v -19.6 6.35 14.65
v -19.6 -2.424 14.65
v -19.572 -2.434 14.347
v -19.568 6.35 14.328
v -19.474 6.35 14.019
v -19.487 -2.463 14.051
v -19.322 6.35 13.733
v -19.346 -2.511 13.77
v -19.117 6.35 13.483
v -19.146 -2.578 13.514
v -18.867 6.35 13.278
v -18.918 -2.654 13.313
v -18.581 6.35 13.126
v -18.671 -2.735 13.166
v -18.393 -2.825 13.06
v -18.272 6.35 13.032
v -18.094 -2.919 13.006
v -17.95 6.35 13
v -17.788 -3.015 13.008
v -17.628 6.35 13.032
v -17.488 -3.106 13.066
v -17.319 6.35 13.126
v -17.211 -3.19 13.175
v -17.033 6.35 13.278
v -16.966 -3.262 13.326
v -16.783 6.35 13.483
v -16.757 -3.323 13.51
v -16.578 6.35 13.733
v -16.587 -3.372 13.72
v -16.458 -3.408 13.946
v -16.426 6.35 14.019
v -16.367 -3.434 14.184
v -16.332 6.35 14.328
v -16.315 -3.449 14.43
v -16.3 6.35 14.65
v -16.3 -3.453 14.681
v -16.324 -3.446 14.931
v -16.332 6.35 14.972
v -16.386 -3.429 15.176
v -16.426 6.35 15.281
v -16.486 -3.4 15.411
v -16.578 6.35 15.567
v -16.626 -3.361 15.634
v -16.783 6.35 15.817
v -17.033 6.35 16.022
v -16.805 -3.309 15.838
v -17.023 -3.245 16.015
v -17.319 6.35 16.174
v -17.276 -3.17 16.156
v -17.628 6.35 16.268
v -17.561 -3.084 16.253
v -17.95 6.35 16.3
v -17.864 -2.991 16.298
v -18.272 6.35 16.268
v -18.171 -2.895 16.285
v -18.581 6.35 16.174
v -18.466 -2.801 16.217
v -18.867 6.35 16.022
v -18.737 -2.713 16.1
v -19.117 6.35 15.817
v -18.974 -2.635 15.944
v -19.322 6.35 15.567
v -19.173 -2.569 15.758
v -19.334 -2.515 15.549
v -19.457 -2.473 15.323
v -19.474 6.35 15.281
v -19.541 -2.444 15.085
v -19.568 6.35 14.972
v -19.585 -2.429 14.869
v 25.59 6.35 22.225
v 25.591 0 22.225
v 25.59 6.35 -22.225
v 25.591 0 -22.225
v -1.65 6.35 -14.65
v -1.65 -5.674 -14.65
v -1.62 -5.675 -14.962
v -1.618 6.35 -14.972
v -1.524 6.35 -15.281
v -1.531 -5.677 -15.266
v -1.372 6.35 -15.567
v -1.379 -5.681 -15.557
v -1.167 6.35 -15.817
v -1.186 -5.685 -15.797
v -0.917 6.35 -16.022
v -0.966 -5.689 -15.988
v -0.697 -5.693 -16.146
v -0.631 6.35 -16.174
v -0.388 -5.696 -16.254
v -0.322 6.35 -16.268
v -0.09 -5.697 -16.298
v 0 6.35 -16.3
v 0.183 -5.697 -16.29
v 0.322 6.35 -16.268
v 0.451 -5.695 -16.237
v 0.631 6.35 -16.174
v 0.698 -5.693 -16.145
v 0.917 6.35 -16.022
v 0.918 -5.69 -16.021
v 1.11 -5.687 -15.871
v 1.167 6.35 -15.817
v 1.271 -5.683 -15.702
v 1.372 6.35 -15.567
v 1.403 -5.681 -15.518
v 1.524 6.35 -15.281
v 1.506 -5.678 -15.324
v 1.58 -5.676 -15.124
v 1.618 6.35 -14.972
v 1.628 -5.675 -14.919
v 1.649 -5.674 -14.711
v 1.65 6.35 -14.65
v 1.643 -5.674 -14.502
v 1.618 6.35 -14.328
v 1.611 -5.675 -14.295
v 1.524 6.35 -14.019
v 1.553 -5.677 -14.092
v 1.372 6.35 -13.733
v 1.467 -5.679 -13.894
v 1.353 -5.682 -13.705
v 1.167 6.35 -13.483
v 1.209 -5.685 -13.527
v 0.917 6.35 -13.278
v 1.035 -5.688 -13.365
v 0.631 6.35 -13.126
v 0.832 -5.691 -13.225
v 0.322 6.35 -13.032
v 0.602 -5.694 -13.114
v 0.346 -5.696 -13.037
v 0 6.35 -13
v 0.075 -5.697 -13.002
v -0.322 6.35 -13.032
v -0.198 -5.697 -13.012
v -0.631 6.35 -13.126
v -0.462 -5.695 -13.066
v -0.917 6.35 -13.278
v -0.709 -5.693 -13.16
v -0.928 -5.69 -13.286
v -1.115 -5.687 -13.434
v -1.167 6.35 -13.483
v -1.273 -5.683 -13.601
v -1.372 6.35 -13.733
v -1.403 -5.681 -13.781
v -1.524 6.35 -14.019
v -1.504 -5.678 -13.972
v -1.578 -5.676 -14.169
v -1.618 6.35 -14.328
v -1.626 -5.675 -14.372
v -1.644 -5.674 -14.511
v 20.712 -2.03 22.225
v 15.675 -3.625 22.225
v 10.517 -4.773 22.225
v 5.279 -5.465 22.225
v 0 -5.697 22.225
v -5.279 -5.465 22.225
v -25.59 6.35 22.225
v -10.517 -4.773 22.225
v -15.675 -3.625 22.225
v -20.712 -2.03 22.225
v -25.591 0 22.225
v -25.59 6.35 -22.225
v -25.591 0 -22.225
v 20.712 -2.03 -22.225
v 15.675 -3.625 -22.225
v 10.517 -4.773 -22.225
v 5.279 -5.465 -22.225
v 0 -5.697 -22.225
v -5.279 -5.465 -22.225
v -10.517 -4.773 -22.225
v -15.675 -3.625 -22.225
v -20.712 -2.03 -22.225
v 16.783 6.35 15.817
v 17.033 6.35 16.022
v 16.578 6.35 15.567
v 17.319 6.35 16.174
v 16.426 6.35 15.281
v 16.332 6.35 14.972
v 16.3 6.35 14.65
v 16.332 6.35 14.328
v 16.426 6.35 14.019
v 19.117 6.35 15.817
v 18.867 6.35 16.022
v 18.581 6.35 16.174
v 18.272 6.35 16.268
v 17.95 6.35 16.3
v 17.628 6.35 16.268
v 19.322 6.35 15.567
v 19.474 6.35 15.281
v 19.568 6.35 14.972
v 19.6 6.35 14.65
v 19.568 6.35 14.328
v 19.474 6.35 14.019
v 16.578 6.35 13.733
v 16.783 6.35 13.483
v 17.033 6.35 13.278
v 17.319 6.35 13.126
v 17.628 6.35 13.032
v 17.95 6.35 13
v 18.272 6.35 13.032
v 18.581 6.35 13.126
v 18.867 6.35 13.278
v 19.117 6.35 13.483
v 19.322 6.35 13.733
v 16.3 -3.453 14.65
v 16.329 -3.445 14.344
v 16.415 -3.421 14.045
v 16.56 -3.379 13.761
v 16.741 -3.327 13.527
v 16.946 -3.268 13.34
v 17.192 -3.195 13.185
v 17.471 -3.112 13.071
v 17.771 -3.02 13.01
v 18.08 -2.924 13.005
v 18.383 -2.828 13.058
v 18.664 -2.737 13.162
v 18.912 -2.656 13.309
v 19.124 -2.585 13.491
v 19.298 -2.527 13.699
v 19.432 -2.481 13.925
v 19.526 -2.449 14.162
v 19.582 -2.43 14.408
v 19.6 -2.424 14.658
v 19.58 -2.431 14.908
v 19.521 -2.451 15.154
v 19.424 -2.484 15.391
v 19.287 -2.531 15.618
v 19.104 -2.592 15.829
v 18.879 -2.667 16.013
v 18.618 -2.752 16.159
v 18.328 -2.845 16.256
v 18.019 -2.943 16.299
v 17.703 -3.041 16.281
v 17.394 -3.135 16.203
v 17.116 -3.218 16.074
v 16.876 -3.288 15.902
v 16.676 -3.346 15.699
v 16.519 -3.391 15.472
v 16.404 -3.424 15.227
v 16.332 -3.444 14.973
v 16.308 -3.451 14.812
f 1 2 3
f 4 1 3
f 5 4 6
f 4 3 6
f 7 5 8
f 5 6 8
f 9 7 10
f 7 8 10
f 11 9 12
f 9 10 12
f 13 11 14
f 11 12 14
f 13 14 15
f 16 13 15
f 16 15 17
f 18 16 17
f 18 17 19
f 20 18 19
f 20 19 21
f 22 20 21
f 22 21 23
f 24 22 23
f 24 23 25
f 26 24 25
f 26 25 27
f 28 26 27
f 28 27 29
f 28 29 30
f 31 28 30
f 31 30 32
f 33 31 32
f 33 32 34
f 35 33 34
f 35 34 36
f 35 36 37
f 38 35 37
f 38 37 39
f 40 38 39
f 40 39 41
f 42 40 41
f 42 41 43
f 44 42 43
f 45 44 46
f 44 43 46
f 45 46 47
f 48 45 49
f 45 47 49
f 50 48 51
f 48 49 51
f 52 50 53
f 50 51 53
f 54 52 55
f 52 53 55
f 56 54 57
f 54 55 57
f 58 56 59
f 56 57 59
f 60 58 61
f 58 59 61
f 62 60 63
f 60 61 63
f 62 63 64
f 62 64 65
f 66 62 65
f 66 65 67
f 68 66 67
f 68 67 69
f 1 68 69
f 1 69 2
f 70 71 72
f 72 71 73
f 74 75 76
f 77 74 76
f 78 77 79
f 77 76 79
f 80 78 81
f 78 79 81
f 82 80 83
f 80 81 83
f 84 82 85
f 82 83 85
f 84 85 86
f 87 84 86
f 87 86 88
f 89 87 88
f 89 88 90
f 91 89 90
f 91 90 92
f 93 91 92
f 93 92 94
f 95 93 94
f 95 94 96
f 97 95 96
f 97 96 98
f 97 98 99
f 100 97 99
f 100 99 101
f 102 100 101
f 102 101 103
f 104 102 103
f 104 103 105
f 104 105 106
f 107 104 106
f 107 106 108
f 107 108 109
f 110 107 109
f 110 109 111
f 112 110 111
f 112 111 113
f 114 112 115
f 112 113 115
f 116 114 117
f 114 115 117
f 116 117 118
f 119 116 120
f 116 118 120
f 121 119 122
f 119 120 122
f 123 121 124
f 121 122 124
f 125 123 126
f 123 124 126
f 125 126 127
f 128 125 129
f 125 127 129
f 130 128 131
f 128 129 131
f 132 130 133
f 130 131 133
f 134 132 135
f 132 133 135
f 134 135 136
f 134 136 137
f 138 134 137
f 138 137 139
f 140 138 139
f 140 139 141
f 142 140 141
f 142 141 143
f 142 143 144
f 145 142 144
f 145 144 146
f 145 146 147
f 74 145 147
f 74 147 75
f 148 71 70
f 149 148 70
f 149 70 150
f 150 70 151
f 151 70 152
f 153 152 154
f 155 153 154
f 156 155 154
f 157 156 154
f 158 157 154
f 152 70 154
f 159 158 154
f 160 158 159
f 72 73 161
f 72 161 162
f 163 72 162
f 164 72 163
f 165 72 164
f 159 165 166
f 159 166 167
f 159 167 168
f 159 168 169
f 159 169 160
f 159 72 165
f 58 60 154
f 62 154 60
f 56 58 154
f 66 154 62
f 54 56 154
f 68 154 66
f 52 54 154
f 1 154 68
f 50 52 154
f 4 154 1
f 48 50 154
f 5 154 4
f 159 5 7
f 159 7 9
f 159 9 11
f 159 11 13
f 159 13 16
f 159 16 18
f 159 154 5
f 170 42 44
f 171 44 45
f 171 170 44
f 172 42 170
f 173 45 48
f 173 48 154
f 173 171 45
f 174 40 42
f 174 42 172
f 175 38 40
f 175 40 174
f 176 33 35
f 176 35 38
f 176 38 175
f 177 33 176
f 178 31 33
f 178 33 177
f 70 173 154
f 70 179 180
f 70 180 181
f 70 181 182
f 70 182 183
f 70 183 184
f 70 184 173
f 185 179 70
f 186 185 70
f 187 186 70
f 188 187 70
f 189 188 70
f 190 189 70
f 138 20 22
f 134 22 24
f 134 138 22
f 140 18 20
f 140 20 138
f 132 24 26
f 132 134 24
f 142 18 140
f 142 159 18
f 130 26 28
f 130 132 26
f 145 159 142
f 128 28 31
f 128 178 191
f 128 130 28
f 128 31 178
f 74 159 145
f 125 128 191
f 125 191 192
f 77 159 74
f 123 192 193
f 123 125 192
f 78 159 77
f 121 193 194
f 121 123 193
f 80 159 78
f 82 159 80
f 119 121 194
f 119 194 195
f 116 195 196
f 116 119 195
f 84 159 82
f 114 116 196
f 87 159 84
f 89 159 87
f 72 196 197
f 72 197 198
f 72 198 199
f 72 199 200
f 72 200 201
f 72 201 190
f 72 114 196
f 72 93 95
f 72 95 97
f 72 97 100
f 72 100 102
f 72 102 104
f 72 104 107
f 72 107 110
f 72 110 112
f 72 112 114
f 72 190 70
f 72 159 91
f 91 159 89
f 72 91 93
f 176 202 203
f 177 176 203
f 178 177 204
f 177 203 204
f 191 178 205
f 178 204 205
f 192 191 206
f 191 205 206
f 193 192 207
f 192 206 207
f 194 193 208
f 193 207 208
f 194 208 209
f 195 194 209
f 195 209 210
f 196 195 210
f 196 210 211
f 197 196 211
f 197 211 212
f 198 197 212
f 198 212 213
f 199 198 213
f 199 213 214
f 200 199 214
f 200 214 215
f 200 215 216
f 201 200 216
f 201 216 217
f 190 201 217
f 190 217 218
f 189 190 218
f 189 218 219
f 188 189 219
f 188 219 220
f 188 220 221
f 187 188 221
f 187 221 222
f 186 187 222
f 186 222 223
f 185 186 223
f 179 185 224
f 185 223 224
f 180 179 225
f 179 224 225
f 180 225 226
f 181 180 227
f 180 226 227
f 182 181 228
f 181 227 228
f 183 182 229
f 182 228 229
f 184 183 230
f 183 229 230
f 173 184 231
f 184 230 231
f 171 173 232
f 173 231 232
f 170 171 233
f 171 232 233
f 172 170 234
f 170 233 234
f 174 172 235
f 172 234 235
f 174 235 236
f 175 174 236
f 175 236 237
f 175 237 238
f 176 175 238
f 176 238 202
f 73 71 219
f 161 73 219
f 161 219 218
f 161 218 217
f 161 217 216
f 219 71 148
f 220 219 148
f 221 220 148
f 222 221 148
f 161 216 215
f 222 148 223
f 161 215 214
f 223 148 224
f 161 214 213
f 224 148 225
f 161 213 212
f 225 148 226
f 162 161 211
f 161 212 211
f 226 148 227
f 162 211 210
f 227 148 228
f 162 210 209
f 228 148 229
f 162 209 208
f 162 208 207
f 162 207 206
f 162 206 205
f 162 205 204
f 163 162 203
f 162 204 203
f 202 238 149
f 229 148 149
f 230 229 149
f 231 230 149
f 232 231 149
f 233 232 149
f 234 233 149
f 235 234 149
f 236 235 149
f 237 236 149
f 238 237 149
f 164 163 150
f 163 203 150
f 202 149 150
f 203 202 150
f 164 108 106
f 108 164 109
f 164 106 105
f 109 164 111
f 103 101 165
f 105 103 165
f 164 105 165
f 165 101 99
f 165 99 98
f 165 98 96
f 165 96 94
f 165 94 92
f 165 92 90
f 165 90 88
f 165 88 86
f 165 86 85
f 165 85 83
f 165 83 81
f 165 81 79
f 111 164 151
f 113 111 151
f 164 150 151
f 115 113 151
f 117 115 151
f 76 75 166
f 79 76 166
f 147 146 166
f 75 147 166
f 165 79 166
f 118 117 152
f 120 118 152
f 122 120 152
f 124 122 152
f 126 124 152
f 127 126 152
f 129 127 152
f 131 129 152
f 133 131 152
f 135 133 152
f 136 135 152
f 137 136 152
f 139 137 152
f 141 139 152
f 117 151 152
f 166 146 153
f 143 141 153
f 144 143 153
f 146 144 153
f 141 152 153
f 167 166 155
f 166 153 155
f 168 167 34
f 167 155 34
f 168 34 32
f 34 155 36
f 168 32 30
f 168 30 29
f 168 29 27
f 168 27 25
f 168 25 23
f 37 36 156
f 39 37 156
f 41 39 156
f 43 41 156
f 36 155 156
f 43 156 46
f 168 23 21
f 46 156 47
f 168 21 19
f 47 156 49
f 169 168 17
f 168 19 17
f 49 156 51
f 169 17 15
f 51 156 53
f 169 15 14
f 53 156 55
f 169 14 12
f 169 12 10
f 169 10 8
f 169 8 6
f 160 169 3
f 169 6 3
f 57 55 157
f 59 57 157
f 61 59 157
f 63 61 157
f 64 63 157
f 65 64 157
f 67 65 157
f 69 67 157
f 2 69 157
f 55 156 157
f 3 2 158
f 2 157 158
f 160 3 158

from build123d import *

# Parameters (mm, degrees)
SKETCH1_W             = 51.181
SKETCH1_H             = 44.45
BOSS_EXTRUDE1_DEPTH   = 6.35
BOSS_EXTRUDE2_DEPTH   = 44.45
M4X0_7_TAPPED_HOLE1_D = 3.3


with BuildPart() as part:
    # Sketch1 → Boss-Extrude1 (new body)
    with BuildSketch(Plane(origin=(0, 0, 0), x_dir=(1, 0, 0), z_dir=(0, 1, 0))):
        Rectangle(SKETCH1_W, SKETCH1_H)
    extrude(amount=BOSS_EXTRUDE1_DEPTH)

    # Sketch2 → Boss-Extrude2 (add)
    with BuildSketch(Plane.XY.offset(22.225)):
        with BuildLine():
            Line((-25.5905, 0), (25.5905, 0))
            ThreePointArc((25.5905, 0), (0, -5.696875973), (-25.5905, 0))
        make_face()
    extrude(amount=-BOSS_EXTRUDE2_DEPTH)

    # M4x0.7 Tapped Hole1 (through all)
    with Locations(Plane(origin=(0, 6.35, 0), x_dir=(1, 0, 0), z_dir=(0, 1, 0))):
        with Locations((0, 14.65), (-17.950000041, -14.65), (17.950000041, -14.65)):
            Hole(M4X0_7_TAPPED_HOLE1_D / 2)


solid = part.part
